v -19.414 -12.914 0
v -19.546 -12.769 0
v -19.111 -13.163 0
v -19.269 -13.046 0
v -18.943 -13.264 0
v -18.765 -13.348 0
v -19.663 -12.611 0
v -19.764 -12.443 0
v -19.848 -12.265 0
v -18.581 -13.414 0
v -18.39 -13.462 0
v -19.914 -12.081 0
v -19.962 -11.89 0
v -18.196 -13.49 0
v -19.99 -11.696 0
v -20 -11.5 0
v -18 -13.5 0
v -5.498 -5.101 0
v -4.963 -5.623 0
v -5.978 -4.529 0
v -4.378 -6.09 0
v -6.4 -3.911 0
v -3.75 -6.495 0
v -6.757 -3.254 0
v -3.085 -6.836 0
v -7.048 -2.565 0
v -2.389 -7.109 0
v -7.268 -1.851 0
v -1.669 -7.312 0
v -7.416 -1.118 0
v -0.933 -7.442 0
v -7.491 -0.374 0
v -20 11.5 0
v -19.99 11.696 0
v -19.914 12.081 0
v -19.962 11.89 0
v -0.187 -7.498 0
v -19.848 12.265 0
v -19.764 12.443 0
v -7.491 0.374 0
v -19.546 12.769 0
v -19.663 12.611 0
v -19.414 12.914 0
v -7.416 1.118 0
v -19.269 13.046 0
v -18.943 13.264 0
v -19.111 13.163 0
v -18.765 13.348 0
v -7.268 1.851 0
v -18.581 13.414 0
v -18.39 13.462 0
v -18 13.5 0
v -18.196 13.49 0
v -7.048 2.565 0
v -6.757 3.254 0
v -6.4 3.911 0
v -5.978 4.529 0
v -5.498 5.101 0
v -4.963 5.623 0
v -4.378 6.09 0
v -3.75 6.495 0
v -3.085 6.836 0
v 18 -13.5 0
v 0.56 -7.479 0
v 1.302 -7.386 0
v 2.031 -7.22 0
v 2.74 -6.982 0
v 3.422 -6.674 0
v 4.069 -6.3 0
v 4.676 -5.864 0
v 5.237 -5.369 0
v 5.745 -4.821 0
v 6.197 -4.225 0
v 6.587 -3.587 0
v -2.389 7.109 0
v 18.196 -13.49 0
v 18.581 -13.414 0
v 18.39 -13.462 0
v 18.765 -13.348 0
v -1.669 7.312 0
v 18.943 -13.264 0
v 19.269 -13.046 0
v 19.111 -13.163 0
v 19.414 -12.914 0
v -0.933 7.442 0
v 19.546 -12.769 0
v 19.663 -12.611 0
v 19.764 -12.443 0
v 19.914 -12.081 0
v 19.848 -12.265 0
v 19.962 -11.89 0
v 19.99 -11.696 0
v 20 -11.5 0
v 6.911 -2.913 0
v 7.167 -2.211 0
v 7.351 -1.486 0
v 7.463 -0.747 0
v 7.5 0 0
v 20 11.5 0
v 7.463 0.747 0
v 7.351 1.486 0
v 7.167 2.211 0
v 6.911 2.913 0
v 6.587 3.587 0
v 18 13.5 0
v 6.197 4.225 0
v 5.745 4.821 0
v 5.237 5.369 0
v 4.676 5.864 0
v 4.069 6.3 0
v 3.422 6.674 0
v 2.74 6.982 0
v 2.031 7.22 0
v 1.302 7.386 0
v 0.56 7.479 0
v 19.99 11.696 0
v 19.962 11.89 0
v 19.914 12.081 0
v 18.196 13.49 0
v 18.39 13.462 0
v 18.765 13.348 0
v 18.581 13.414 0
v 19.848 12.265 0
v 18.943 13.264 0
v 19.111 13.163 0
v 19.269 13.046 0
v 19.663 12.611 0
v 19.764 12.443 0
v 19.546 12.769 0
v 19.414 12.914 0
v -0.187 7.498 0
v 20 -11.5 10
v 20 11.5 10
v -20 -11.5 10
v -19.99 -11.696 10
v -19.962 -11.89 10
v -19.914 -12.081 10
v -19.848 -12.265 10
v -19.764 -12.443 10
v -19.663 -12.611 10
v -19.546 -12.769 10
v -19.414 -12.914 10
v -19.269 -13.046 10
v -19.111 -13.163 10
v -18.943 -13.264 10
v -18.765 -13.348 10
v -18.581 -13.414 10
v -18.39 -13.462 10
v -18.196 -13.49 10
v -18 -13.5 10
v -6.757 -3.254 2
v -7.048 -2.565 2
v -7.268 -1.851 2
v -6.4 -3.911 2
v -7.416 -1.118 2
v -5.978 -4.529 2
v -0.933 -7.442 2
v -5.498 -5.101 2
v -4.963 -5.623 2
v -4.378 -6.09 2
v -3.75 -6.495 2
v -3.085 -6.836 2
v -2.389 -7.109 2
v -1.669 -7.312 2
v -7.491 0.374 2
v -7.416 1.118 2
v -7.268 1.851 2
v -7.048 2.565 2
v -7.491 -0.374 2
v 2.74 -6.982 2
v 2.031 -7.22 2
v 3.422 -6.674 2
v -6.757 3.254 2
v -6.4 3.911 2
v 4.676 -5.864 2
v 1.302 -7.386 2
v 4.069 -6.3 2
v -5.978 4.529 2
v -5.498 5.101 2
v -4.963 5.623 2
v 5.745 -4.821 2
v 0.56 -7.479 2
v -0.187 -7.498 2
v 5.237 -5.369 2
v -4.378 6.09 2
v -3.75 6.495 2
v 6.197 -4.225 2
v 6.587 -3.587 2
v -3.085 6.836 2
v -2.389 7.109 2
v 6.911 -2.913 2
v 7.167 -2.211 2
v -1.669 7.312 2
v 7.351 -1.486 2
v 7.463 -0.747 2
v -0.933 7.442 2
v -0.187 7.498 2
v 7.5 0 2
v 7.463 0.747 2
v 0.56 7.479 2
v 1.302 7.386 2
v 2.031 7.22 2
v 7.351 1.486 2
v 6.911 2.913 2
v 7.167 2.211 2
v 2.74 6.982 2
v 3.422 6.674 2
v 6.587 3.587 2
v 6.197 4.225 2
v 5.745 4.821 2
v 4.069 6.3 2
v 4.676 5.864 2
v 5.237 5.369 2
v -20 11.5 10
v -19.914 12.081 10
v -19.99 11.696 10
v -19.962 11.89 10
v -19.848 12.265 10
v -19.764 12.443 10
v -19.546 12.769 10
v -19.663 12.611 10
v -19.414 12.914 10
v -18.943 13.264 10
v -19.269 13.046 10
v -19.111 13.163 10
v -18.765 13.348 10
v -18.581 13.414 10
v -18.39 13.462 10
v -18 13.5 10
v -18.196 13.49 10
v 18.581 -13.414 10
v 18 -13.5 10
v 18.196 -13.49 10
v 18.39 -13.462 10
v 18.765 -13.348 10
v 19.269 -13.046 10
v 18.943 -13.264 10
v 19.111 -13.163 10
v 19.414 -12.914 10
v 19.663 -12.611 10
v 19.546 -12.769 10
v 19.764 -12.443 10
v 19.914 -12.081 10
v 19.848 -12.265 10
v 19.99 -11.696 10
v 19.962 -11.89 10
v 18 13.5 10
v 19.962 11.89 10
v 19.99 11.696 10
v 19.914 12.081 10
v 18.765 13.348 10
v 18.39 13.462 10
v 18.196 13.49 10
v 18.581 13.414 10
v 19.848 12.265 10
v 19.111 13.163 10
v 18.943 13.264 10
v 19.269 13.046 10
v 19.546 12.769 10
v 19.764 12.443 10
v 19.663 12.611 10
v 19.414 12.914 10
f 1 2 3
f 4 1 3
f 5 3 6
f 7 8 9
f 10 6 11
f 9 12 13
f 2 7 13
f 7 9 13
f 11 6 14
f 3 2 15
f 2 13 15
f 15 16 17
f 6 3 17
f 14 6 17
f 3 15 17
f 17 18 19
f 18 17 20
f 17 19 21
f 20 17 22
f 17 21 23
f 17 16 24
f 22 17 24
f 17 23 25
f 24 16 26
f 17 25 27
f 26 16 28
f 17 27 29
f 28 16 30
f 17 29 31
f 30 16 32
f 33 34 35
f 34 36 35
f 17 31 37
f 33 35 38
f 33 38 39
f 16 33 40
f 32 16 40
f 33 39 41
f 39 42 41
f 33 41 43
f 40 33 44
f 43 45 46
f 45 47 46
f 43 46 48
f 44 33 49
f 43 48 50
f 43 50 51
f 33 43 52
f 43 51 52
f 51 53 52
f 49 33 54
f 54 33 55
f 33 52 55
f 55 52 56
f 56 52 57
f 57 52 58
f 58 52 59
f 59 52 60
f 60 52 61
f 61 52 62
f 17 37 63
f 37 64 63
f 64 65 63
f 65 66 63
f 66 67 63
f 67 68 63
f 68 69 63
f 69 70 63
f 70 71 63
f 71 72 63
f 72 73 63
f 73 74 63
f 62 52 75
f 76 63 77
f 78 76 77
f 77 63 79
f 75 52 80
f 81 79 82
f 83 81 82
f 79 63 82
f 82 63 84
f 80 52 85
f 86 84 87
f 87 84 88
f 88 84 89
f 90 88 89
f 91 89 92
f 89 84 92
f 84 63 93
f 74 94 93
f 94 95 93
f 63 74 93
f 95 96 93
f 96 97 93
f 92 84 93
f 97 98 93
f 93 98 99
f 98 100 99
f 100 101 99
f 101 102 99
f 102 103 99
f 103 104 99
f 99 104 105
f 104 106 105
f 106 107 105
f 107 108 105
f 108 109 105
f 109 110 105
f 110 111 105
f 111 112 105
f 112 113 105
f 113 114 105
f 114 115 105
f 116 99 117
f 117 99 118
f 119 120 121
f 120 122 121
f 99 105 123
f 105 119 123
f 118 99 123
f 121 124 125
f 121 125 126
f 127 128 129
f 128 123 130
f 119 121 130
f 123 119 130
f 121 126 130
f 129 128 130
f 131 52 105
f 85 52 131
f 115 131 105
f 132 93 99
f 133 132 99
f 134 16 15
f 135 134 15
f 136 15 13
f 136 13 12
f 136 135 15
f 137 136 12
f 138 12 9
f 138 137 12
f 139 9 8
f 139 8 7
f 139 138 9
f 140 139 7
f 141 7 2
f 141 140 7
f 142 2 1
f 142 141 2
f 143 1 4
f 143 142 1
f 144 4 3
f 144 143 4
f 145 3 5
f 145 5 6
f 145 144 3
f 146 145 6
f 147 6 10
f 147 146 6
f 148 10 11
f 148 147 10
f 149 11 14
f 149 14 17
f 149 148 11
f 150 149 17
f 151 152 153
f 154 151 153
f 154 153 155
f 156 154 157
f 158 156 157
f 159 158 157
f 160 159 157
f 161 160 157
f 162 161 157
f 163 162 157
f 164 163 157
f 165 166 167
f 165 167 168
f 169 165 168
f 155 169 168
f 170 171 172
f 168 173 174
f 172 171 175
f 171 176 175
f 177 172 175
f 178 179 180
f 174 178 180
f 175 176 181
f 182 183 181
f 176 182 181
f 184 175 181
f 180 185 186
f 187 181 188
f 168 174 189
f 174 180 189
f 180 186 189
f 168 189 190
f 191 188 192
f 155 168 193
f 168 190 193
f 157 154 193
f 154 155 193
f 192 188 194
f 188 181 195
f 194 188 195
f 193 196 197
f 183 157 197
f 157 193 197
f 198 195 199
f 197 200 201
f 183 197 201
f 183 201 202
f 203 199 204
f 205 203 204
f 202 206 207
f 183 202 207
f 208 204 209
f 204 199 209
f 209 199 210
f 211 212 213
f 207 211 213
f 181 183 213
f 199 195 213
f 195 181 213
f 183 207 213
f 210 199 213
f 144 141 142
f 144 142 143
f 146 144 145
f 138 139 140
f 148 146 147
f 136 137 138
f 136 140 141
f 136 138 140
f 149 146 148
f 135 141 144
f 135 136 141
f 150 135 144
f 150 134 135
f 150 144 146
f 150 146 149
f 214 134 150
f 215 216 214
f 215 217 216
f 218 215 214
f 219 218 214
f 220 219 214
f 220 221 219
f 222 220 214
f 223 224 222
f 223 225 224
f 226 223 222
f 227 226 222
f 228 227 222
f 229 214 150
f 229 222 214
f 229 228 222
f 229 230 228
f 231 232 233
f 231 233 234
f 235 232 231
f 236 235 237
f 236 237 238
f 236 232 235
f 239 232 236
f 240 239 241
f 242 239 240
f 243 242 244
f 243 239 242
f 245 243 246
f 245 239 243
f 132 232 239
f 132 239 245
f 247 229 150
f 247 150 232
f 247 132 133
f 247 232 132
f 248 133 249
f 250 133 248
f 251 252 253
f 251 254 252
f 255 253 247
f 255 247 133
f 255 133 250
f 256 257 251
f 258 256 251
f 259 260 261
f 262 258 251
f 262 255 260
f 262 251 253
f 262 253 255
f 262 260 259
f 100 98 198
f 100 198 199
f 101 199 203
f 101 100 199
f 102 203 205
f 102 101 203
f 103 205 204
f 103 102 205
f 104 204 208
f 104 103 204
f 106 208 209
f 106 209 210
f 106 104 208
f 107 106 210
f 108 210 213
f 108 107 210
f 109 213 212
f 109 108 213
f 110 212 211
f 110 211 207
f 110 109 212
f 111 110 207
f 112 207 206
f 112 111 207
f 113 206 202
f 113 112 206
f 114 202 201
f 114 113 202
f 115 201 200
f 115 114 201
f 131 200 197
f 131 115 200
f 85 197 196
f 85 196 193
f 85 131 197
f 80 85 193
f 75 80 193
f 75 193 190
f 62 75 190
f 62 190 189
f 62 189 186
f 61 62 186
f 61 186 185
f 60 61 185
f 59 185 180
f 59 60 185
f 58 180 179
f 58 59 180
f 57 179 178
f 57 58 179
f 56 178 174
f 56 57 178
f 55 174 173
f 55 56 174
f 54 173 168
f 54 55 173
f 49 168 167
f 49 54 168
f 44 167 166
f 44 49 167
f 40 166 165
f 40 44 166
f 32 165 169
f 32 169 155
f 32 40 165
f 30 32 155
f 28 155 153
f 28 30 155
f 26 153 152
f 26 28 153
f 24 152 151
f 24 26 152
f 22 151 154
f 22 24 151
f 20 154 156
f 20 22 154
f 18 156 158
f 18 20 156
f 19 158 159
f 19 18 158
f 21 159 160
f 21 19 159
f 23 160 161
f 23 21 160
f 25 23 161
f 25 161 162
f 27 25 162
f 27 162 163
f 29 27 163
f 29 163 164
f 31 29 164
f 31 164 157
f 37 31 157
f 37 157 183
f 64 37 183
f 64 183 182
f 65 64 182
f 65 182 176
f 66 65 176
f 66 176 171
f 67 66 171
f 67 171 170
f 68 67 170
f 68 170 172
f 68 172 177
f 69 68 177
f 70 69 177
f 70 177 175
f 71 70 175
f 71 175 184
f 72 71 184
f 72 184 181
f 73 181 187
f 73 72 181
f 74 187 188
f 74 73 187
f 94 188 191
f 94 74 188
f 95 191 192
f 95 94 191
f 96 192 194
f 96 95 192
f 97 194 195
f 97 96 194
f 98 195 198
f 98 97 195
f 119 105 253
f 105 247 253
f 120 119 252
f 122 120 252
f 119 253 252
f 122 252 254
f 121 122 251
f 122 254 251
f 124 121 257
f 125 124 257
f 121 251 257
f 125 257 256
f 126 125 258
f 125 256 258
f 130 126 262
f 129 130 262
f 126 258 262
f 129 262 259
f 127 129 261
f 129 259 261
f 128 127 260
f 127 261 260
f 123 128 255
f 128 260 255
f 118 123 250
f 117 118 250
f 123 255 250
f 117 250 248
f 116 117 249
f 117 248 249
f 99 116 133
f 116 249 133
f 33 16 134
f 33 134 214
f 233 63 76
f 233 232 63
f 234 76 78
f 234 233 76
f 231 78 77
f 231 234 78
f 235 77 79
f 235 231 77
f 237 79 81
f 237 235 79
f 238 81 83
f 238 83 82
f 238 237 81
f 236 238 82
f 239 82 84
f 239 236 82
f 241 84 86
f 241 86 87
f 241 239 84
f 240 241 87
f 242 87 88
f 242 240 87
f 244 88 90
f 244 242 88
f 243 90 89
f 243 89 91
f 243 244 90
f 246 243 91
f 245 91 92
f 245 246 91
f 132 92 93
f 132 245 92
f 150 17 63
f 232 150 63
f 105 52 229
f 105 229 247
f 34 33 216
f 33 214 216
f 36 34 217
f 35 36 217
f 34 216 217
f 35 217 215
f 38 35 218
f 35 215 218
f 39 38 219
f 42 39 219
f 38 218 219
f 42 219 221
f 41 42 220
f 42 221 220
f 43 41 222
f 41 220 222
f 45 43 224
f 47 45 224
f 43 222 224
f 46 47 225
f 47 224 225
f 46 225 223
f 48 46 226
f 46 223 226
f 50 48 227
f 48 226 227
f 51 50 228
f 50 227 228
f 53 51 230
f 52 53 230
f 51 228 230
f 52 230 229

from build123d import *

# Parameters (mm, degrees)
F0_W     = 40
F0_H     = 27
F0_R     = 7.5
F1_DEPTH = 10
F2_DEPTH = 2
F3_R     = 2


with BuildPart() as f1:
    # F0 (on Top) → F1 (new body)
    with BuildSketch(Plane.XY):
        Rectangle(F0_W, F0_H)
        Circle(F0_R, mode=Mode.SUBTRACT)
        Circle(F0_R)
    extrude(amount=F1_DEPTH)

    # F0 (on Top) → F2 (cut)
    with BuildSketch(Plane.XY):
        Circle(F0_R)
    extrude(amount=F2_DEPTH, mode=Mode.SUBTRACT)

    # F3
    f3_edges = [f1.edges().sort_by_distance(p)[0] for p in [
        (20, -13.5, 5),
        (20, 13.5, 5),
        (-20, 13.5, 5),
        (-20, -13.5, 5),
    ]]
    fillet(f3_edges, radius=F3_R)


solid = f1.part
